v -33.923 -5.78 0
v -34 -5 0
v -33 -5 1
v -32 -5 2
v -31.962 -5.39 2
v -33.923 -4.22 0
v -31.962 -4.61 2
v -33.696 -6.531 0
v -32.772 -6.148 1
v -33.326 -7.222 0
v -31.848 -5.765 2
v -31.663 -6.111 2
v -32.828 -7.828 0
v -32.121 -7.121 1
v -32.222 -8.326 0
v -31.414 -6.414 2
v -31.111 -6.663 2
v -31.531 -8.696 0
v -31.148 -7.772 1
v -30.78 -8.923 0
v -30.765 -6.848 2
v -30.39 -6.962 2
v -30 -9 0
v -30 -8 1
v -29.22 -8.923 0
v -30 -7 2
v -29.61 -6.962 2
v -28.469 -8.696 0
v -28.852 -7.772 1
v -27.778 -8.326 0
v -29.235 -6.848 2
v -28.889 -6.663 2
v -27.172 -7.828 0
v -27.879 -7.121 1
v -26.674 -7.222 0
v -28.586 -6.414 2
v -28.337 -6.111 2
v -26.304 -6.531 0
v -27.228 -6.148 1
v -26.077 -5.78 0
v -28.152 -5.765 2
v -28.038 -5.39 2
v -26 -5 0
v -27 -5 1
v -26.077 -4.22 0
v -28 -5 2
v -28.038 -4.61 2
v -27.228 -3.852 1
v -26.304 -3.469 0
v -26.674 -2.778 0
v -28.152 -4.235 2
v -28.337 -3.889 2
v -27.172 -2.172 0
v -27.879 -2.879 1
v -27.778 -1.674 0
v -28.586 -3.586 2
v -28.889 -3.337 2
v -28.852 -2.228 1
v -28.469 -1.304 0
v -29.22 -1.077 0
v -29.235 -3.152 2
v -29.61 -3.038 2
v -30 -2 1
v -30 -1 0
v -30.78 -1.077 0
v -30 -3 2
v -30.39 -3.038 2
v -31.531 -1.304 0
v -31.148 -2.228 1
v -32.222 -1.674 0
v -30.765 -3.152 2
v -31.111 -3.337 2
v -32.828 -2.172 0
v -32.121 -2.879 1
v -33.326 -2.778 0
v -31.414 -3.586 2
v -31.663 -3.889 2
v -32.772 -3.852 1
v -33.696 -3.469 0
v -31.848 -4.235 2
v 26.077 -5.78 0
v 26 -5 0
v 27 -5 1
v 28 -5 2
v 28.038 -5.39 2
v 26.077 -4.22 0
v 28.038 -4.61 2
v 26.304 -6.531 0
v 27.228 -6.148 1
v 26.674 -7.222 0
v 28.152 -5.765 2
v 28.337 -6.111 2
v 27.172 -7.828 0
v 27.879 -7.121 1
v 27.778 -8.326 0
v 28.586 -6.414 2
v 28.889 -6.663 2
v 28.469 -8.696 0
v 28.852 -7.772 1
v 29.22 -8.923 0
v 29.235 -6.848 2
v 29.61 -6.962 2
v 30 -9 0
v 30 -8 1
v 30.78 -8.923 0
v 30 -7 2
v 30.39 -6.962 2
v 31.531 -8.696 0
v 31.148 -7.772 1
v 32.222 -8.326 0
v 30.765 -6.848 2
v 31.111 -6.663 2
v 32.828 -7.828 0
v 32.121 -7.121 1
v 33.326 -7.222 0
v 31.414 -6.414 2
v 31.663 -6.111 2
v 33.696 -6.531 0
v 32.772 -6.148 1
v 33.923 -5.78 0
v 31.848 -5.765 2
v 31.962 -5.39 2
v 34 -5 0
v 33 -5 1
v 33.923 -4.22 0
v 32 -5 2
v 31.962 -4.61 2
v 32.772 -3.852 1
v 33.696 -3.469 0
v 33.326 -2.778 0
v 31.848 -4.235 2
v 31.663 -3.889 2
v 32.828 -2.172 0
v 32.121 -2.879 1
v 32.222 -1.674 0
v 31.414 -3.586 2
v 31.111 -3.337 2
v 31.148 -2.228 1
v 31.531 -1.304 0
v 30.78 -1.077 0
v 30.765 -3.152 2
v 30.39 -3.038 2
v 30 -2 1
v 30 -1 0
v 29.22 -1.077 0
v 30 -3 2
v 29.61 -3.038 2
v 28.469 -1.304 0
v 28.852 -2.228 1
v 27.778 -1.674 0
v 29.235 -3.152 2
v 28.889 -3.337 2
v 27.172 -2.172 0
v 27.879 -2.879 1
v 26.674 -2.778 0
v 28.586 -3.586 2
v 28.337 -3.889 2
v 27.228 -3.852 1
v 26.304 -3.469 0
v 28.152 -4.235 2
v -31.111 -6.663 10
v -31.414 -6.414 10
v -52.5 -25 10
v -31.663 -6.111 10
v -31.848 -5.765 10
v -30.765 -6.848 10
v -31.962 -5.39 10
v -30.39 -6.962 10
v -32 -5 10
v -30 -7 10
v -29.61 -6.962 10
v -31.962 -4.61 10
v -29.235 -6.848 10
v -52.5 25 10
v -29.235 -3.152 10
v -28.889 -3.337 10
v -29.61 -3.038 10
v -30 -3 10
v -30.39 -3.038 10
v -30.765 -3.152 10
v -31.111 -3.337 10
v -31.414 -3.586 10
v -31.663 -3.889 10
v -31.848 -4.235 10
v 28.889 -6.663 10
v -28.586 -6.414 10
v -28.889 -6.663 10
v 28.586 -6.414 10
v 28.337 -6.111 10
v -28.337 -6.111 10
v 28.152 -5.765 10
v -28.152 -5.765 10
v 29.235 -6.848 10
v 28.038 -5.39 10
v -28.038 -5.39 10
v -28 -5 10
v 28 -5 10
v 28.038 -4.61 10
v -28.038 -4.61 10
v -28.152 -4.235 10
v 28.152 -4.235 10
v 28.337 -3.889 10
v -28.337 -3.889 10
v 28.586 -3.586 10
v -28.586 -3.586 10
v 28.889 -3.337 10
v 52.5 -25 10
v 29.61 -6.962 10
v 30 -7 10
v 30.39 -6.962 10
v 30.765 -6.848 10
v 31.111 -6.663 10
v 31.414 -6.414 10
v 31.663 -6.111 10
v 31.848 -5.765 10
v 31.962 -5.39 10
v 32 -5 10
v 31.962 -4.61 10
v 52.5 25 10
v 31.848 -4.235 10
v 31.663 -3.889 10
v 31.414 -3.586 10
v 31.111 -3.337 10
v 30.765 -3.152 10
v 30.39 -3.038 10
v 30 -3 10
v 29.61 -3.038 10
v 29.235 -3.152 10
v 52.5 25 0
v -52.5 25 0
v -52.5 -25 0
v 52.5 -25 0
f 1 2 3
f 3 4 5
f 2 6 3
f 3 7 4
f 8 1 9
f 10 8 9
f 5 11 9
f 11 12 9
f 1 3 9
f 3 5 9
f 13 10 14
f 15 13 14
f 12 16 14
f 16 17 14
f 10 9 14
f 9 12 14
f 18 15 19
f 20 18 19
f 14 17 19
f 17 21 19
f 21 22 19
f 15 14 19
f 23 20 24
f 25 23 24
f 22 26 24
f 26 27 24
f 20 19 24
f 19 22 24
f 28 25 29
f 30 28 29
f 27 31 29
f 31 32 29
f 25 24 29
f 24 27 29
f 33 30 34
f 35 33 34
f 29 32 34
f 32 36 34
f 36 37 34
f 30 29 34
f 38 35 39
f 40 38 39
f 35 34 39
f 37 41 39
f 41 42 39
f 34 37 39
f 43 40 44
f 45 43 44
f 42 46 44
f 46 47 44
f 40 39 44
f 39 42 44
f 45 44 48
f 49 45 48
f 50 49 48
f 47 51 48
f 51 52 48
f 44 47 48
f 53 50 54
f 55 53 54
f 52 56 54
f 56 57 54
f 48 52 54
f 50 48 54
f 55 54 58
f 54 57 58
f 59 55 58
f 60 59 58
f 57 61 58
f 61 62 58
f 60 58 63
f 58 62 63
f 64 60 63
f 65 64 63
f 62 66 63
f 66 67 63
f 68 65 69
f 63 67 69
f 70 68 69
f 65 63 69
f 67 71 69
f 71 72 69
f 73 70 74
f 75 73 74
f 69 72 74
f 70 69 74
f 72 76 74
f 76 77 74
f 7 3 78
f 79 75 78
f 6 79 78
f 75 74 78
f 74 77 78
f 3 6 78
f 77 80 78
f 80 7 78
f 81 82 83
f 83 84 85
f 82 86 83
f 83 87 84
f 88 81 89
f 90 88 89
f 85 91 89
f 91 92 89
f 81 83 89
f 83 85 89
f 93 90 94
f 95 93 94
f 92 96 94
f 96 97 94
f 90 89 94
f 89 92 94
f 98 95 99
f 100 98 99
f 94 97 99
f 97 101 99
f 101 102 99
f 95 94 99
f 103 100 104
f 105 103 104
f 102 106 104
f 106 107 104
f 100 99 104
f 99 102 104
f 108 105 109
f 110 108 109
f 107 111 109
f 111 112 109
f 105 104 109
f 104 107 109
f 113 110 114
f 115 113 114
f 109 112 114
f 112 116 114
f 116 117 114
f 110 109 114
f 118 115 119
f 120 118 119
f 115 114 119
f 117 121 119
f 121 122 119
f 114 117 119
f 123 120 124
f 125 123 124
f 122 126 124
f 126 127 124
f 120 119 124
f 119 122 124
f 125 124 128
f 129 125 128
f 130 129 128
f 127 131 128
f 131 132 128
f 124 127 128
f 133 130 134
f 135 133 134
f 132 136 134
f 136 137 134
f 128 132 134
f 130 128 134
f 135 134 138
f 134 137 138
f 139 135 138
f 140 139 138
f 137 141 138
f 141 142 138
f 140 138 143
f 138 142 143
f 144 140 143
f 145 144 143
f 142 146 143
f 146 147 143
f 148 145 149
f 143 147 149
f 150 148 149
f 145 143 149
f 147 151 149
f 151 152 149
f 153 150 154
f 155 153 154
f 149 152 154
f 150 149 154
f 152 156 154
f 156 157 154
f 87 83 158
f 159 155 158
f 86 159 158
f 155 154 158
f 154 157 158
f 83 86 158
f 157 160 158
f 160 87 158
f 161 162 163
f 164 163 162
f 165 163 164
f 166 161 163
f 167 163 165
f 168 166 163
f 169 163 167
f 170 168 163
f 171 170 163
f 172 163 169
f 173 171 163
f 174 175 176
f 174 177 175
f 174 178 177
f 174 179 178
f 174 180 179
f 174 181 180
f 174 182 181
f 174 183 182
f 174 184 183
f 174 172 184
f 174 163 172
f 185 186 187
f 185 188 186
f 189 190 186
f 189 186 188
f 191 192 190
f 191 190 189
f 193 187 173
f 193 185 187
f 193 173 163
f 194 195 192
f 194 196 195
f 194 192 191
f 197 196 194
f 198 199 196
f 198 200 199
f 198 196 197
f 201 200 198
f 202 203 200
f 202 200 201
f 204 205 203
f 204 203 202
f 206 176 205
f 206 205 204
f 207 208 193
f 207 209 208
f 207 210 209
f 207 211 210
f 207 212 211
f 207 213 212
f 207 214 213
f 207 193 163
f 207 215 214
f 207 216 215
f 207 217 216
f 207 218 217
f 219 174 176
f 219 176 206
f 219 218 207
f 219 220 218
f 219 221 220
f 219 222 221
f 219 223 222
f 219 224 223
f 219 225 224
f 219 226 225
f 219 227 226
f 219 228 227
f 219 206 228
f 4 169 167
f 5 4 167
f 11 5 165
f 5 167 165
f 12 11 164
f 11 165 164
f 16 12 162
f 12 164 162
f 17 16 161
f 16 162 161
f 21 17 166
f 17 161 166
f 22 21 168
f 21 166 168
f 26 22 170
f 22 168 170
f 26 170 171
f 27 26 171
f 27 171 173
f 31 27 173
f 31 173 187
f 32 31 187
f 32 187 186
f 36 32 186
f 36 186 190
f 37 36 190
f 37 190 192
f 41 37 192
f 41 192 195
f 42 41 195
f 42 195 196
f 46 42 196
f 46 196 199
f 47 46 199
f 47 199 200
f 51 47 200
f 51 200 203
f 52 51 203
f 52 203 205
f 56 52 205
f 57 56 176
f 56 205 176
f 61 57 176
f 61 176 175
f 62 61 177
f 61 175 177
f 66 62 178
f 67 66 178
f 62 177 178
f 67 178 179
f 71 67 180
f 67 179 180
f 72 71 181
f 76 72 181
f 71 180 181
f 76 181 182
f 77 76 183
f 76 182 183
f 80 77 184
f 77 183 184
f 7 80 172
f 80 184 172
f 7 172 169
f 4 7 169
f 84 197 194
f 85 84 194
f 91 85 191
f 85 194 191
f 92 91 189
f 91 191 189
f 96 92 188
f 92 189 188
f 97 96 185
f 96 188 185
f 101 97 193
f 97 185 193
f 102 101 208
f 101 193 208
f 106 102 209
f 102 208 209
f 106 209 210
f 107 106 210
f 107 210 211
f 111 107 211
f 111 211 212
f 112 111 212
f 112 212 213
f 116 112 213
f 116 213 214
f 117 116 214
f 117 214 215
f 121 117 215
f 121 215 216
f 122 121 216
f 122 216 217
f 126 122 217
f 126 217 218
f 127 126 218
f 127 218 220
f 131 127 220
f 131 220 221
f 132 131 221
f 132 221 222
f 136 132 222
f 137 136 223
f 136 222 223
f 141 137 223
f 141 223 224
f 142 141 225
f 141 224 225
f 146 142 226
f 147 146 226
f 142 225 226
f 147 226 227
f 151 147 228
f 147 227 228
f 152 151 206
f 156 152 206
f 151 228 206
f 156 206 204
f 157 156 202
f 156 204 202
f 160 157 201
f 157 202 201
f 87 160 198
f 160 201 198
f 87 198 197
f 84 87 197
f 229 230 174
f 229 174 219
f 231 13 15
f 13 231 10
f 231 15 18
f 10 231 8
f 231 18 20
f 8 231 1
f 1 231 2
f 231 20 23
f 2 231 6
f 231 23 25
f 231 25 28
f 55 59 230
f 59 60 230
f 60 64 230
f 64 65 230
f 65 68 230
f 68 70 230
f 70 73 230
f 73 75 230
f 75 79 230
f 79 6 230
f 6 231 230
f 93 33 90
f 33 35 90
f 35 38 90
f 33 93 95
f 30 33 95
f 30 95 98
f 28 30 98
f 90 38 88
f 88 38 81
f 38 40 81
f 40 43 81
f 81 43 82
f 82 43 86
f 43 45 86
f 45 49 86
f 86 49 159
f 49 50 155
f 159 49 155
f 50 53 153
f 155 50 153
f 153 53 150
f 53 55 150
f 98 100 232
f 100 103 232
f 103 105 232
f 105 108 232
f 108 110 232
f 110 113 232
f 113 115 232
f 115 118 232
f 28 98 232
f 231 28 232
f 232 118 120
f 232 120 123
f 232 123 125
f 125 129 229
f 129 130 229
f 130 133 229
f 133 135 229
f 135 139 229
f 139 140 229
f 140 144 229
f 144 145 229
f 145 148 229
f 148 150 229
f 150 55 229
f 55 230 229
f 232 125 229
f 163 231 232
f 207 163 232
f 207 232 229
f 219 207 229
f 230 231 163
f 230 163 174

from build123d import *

# Parameters (mm, degrees)
F0_W     = 105
F0_H     = 50
F1_DEPTH = 10
F3_DEPTH = 10.001
F4_SIZE  = 2


with BuildPart() as f1:
    # F0 (on Top) → F1 (new body)
    with BuildSketch(Plane.XY):
        Rectangle(F0_W, F0_H)
    extrude(amount=F1_DEPTH)

    # F2 (on face) → F3 (cut, through all)
    with BuildSketch(Plane.XY.offset(10)):
        with BuildLine():
            ThreePointArc((-28, -5), (-30, -3), (-32, -5))
            Line((-32, -5), (-28, -5))
        make_face()
        with BuildLine():
            Line((-28, -5), (-32, -5))
            ThreePointArc((-32, -5), (-30, -7), (-28, -5))
        make_face()
        with BuildLine():
            ThreePointArc((32, -5), (30, -3), (28, -5))
            Line((28, -5), (32, -5))
        make_face()
        with BuildLine():
            Line((32, -5), (28, -5))
            ThreePointArc((28, -5), (30, -7), (32, -5))
        make_face()
    extrude(amount=-F3_DEPTH, mode=Mode.SUBTRACT)

    # F4
    f4_edges = [f1.edges().sort_by_distance(p)[0] for p in [
        (32, -5, 0),
        (-28, -5, 0),
    ]]
    chamfer(f4_edges, length=F4_SIZE)


solid = f1.part
